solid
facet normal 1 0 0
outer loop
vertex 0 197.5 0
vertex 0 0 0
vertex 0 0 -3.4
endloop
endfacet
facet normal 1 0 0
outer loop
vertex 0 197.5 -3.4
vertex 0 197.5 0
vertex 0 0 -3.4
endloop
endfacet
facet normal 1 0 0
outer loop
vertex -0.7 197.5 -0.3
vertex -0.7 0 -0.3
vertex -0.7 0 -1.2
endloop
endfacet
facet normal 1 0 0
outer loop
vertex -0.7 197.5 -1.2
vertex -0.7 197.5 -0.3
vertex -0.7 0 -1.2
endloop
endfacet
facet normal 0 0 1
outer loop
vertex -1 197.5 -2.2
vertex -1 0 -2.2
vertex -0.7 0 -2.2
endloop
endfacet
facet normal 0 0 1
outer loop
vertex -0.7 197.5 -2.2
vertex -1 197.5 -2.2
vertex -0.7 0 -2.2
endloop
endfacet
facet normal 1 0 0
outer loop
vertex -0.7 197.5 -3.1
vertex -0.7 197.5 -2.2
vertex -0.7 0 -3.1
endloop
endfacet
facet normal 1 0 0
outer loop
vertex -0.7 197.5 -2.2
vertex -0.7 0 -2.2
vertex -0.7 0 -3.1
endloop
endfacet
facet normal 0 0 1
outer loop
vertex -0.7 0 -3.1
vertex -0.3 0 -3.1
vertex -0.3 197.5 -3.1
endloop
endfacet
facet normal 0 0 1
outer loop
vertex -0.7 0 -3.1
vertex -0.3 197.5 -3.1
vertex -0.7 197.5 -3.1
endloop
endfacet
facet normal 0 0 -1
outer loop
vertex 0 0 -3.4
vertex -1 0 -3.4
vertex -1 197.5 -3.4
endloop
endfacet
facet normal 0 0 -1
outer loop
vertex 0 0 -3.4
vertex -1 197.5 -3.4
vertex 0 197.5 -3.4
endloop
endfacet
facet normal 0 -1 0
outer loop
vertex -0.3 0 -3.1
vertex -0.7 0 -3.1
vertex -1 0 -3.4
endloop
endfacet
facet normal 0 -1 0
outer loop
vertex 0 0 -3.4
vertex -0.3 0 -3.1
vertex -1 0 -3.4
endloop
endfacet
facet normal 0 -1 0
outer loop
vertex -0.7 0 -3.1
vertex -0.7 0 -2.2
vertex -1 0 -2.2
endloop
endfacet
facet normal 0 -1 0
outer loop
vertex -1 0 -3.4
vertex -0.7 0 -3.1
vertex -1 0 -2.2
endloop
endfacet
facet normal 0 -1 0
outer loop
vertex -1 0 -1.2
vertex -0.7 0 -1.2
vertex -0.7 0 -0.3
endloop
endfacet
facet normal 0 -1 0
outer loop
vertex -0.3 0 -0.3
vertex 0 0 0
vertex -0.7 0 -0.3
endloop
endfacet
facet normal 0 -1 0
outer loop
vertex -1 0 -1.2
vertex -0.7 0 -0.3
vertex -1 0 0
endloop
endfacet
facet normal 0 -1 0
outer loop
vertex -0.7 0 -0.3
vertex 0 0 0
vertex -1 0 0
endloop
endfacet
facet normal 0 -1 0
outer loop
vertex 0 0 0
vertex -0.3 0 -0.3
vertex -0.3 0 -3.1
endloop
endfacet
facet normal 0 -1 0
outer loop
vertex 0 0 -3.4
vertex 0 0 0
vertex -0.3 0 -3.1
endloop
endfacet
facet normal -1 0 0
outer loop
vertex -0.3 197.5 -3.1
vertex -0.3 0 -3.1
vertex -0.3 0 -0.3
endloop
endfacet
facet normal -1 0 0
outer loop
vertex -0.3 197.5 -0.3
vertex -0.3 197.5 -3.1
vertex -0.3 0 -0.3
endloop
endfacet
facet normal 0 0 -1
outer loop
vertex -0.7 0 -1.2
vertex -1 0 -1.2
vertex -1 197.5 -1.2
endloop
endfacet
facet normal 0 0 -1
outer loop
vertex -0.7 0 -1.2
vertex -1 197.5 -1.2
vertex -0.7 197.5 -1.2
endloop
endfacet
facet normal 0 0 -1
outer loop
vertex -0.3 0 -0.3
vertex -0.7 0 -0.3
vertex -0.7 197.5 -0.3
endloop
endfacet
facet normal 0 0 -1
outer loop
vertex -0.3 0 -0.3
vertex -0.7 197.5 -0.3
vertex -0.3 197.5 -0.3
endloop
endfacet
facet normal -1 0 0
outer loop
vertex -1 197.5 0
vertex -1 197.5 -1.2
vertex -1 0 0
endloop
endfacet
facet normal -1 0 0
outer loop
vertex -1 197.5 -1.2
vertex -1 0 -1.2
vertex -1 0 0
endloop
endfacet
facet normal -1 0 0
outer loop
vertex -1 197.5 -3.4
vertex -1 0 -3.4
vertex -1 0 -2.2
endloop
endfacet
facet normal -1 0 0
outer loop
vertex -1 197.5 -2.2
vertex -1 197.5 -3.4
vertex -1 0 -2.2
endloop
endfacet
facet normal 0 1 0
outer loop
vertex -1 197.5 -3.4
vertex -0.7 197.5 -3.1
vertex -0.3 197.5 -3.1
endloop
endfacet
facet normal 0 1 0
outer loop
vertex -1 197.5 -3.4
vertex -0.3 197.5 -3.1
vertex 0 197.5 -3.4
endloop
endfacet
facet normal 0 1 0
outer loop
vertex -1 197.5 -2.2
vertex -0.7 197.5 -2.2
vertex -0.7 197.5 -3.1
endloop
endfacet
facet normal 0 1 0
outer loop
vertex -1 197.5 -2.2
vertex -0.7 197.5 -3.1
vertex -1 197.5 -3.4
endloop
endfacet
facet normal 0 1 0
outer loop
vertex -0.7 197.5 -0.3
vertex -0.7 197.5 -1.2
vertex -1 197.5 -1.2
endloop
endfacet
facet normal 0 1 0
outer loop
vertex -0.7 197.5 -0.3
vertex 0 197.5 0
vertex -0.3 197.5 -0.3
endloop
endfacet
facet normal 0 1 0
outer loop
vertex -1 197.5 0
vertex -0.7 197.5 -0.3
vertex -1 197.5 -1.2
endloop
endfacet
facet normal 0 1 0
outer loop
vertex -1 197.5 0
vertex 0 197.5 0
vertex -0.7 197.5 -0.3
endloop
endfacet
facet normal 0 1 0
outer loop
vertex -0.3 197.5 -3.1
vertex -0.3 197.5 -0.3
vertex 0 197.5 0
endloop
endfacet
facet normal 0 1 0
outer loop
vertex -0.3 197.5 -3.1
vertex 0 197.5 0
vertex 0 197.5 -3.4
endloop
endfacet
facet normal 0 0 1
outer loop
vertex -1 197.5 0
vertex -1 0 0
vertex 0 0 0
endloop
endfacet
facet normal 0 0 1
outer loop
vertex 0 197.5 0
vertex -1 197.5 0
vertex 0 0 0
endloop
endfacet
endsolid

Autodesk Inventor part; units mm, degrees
ref_plane "YZ Plane" through (0, 0, 0) normal (1, 0, 0) x (0, 1, 0)
ref_plane "XZ Plane" through (0, 0, 0) normal (0, 1, 0) x (-1, 0, 0)
ref_plane "XY Plane" through (0, 0, 0) normal (0, 0, 1) x (1, 0, 0)
sketch "Skizze2" plane through (0, 0, 0) normal (0, 1, 0) x (-1, 0, 0)
  line L0 (0, 0) -> (1, 0) construction
  line L1 (1, 0) -> (1, -3.4) construction
  line L2 (1, -3.4) -> (0, -3.4) construction
  line L3 (0, -3.4) -> (0, 0) construction
  line L4 (0.7, -3.1) -> (0.7, -0.3) construction
  line L5 (0.7, -0.3) -> (0.3, -0.3) construction
  line L6 (0.3, -0.3) -> (0.3, -3.1) construction
  line L7 (0.3, -3.1) -> (0.7, -3.1) construction
  line L8 (1, -1.7) -> (0, -1.7) construction
  line L9 (1, -1.2) -> (0.7, -1.2)
  line L10 (1, -2.2) -> (0.7, -2.2)
  line L11 (1, -1.2) -> (1, 0)
  line L12 (0, 0) -> (0, -3.4)
  line L13 (1, -3.4) -> (1, -2.2)
  line L14 (0.7, -2.2) -> (0.7, -3.1)
  line L15 (0.3, -3.1) -> (0.3, -0.3)
  line L16 (0.7, -0.3) -> (0.7, -1.2)
  line L17 (0.7, -0.3) -> (0.3, -0.3)
  line L18 (1, 0) -> (0, 0)
  line L19 (0.3, -3.1) -> (0.7, -3.1)
  line L20 (1, -3.4) -> (0, -3.4)
  dimension "d0" = 1
  dimension "d1" = 3.4
  dimension "d2" = 0.3
  dimension "d3" = 0.5
  dimension "d4" = 0.5
extrude "Extrusion1" add sketch "Skizze2" along normal blind 197.5
equation "\"Biegeradius\" = Stärke"
equation "\"BreiteBiegungsfreistellung\" = Stärke"
equation "\"TiefeBiegungsfreistellung\" = 0.5 * Stärke"
equation "\"GrößeEckenfreistellung\" = 4 * Stärke"
equation "\"MinimalRest\" = 2 * Stärke"
equation "\"Übergangsradius\" = Biegeradius"
equation "\"JacobiRadiusGröße\" = Biegeradius"
equation "\"Abstandsgröße\" = Stärke"
equation "\"Stärke\" = 0.5"
properties part number "Boden_airline_eckig"
